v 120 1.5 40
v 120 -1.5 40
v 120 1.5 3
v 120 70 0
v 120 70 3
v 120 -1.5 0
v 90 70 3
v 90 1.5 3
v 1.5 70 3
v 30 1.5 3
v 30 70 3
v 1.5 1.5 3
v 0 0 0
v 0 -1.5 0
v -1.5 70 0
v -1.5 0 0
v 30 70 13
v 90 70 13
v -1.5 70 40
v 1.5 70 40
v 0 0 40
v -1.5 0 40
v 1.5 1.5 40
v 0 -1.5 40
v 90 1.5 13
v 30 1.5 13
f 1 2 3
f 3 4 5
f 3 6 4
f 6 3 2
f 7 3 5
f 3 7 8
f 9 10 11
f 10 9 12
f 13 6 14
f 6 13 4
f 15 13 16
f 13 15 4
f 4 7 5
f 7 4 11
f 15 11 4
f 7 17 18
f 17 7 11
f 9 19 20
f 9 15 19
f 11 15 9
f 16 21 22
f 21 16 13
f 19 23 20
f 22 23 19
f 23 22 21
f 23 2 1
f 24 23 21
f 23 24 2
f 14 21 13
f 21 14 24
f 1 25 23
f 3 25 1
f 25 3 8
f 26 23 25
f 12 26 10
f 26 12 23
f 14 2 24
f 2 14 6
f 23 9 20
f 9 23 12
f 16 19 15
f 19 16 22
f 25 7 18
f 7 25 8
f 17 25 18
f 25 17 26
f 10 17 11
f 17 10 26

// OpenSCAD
$fn = 64;

// --- Dimensions (mm) ---
outer_x = 120;
outer_y = 70;
outer_z = 40;
wall_thick = 3;
floor_thick = 3;

// Platform Dimensions
platform_x = 60;
platform_z = 10; // Height above inner floor
platform_z_pos = 13; // Inner floor is at 3, so top is at 3+10 = 13

// Electrode Holes
hole_dia = 2;
hole_z = 30;
hole_y = 0;

// Derived Dimensions
// Corrected: Inner dimensions are calculated by subtracting wall thickness from outer dimensions
inner_x = outer_x - (wall_thick * 2);
inner_y = outer_y - (wall_thick * 2);
inner_z = outer_z - floor_thick;

// --- Main Body ---
union() {
    // Floor
    translate([0, 0, 0])
    cube([outer_x, outer_y, floor_thick]);

    // Walls
    // Front/Back (Y direction)
    translate([0, -wall_thick/2, 0])
    cube([outer_x, wall_thick, outer_z]);
    
    // Left/Right (X direction)
    translate([-wall_thick/2, 0, 0])
    cube([wall_thick, outer_y, outer_z]);

    // Platform
    translate([(outer_x - platform_x)/2, 0, floor_thick])
    cube([platform_x, outer_y, platform_z]);
}

// --- Cavity (Buffer Chambers) ---
difference() {
    // Subtract the void from the solid
    union() {
        // Inner Floor Void
        translate([0, 0, 0])
        cube([inner_x, inner_y, floor_thick]);
        
        // Inner Walls Void
        // Front/Back
        translate([0, -wall_thick/2, 0])
        cube([inner_x, wall_thick, outer_z]);
        
        // Left/Right
        translate([-wall_thick/2, 0, 0])
        cube([wall_thick, inner_y, outer_z]);
        
        // Platform Void
        translate([(outer_x - platform_x)/2, 0, floor_thick])
        cube([platform_x, outer_y, platform_z]);
    }

    // Electrode Holes (Left End)
    translate([-wall_thick/2, hole_y, hole_z])
    cylinder(d = hole_dia, h = wall_thick + 0.5);

    // Electrode Holes (Right End)
    translate([outer_x - wall_thick/2, hole_y, hole_z])
    cylinder(d = hole_dia, h = wall_thick + 0.5);
}
